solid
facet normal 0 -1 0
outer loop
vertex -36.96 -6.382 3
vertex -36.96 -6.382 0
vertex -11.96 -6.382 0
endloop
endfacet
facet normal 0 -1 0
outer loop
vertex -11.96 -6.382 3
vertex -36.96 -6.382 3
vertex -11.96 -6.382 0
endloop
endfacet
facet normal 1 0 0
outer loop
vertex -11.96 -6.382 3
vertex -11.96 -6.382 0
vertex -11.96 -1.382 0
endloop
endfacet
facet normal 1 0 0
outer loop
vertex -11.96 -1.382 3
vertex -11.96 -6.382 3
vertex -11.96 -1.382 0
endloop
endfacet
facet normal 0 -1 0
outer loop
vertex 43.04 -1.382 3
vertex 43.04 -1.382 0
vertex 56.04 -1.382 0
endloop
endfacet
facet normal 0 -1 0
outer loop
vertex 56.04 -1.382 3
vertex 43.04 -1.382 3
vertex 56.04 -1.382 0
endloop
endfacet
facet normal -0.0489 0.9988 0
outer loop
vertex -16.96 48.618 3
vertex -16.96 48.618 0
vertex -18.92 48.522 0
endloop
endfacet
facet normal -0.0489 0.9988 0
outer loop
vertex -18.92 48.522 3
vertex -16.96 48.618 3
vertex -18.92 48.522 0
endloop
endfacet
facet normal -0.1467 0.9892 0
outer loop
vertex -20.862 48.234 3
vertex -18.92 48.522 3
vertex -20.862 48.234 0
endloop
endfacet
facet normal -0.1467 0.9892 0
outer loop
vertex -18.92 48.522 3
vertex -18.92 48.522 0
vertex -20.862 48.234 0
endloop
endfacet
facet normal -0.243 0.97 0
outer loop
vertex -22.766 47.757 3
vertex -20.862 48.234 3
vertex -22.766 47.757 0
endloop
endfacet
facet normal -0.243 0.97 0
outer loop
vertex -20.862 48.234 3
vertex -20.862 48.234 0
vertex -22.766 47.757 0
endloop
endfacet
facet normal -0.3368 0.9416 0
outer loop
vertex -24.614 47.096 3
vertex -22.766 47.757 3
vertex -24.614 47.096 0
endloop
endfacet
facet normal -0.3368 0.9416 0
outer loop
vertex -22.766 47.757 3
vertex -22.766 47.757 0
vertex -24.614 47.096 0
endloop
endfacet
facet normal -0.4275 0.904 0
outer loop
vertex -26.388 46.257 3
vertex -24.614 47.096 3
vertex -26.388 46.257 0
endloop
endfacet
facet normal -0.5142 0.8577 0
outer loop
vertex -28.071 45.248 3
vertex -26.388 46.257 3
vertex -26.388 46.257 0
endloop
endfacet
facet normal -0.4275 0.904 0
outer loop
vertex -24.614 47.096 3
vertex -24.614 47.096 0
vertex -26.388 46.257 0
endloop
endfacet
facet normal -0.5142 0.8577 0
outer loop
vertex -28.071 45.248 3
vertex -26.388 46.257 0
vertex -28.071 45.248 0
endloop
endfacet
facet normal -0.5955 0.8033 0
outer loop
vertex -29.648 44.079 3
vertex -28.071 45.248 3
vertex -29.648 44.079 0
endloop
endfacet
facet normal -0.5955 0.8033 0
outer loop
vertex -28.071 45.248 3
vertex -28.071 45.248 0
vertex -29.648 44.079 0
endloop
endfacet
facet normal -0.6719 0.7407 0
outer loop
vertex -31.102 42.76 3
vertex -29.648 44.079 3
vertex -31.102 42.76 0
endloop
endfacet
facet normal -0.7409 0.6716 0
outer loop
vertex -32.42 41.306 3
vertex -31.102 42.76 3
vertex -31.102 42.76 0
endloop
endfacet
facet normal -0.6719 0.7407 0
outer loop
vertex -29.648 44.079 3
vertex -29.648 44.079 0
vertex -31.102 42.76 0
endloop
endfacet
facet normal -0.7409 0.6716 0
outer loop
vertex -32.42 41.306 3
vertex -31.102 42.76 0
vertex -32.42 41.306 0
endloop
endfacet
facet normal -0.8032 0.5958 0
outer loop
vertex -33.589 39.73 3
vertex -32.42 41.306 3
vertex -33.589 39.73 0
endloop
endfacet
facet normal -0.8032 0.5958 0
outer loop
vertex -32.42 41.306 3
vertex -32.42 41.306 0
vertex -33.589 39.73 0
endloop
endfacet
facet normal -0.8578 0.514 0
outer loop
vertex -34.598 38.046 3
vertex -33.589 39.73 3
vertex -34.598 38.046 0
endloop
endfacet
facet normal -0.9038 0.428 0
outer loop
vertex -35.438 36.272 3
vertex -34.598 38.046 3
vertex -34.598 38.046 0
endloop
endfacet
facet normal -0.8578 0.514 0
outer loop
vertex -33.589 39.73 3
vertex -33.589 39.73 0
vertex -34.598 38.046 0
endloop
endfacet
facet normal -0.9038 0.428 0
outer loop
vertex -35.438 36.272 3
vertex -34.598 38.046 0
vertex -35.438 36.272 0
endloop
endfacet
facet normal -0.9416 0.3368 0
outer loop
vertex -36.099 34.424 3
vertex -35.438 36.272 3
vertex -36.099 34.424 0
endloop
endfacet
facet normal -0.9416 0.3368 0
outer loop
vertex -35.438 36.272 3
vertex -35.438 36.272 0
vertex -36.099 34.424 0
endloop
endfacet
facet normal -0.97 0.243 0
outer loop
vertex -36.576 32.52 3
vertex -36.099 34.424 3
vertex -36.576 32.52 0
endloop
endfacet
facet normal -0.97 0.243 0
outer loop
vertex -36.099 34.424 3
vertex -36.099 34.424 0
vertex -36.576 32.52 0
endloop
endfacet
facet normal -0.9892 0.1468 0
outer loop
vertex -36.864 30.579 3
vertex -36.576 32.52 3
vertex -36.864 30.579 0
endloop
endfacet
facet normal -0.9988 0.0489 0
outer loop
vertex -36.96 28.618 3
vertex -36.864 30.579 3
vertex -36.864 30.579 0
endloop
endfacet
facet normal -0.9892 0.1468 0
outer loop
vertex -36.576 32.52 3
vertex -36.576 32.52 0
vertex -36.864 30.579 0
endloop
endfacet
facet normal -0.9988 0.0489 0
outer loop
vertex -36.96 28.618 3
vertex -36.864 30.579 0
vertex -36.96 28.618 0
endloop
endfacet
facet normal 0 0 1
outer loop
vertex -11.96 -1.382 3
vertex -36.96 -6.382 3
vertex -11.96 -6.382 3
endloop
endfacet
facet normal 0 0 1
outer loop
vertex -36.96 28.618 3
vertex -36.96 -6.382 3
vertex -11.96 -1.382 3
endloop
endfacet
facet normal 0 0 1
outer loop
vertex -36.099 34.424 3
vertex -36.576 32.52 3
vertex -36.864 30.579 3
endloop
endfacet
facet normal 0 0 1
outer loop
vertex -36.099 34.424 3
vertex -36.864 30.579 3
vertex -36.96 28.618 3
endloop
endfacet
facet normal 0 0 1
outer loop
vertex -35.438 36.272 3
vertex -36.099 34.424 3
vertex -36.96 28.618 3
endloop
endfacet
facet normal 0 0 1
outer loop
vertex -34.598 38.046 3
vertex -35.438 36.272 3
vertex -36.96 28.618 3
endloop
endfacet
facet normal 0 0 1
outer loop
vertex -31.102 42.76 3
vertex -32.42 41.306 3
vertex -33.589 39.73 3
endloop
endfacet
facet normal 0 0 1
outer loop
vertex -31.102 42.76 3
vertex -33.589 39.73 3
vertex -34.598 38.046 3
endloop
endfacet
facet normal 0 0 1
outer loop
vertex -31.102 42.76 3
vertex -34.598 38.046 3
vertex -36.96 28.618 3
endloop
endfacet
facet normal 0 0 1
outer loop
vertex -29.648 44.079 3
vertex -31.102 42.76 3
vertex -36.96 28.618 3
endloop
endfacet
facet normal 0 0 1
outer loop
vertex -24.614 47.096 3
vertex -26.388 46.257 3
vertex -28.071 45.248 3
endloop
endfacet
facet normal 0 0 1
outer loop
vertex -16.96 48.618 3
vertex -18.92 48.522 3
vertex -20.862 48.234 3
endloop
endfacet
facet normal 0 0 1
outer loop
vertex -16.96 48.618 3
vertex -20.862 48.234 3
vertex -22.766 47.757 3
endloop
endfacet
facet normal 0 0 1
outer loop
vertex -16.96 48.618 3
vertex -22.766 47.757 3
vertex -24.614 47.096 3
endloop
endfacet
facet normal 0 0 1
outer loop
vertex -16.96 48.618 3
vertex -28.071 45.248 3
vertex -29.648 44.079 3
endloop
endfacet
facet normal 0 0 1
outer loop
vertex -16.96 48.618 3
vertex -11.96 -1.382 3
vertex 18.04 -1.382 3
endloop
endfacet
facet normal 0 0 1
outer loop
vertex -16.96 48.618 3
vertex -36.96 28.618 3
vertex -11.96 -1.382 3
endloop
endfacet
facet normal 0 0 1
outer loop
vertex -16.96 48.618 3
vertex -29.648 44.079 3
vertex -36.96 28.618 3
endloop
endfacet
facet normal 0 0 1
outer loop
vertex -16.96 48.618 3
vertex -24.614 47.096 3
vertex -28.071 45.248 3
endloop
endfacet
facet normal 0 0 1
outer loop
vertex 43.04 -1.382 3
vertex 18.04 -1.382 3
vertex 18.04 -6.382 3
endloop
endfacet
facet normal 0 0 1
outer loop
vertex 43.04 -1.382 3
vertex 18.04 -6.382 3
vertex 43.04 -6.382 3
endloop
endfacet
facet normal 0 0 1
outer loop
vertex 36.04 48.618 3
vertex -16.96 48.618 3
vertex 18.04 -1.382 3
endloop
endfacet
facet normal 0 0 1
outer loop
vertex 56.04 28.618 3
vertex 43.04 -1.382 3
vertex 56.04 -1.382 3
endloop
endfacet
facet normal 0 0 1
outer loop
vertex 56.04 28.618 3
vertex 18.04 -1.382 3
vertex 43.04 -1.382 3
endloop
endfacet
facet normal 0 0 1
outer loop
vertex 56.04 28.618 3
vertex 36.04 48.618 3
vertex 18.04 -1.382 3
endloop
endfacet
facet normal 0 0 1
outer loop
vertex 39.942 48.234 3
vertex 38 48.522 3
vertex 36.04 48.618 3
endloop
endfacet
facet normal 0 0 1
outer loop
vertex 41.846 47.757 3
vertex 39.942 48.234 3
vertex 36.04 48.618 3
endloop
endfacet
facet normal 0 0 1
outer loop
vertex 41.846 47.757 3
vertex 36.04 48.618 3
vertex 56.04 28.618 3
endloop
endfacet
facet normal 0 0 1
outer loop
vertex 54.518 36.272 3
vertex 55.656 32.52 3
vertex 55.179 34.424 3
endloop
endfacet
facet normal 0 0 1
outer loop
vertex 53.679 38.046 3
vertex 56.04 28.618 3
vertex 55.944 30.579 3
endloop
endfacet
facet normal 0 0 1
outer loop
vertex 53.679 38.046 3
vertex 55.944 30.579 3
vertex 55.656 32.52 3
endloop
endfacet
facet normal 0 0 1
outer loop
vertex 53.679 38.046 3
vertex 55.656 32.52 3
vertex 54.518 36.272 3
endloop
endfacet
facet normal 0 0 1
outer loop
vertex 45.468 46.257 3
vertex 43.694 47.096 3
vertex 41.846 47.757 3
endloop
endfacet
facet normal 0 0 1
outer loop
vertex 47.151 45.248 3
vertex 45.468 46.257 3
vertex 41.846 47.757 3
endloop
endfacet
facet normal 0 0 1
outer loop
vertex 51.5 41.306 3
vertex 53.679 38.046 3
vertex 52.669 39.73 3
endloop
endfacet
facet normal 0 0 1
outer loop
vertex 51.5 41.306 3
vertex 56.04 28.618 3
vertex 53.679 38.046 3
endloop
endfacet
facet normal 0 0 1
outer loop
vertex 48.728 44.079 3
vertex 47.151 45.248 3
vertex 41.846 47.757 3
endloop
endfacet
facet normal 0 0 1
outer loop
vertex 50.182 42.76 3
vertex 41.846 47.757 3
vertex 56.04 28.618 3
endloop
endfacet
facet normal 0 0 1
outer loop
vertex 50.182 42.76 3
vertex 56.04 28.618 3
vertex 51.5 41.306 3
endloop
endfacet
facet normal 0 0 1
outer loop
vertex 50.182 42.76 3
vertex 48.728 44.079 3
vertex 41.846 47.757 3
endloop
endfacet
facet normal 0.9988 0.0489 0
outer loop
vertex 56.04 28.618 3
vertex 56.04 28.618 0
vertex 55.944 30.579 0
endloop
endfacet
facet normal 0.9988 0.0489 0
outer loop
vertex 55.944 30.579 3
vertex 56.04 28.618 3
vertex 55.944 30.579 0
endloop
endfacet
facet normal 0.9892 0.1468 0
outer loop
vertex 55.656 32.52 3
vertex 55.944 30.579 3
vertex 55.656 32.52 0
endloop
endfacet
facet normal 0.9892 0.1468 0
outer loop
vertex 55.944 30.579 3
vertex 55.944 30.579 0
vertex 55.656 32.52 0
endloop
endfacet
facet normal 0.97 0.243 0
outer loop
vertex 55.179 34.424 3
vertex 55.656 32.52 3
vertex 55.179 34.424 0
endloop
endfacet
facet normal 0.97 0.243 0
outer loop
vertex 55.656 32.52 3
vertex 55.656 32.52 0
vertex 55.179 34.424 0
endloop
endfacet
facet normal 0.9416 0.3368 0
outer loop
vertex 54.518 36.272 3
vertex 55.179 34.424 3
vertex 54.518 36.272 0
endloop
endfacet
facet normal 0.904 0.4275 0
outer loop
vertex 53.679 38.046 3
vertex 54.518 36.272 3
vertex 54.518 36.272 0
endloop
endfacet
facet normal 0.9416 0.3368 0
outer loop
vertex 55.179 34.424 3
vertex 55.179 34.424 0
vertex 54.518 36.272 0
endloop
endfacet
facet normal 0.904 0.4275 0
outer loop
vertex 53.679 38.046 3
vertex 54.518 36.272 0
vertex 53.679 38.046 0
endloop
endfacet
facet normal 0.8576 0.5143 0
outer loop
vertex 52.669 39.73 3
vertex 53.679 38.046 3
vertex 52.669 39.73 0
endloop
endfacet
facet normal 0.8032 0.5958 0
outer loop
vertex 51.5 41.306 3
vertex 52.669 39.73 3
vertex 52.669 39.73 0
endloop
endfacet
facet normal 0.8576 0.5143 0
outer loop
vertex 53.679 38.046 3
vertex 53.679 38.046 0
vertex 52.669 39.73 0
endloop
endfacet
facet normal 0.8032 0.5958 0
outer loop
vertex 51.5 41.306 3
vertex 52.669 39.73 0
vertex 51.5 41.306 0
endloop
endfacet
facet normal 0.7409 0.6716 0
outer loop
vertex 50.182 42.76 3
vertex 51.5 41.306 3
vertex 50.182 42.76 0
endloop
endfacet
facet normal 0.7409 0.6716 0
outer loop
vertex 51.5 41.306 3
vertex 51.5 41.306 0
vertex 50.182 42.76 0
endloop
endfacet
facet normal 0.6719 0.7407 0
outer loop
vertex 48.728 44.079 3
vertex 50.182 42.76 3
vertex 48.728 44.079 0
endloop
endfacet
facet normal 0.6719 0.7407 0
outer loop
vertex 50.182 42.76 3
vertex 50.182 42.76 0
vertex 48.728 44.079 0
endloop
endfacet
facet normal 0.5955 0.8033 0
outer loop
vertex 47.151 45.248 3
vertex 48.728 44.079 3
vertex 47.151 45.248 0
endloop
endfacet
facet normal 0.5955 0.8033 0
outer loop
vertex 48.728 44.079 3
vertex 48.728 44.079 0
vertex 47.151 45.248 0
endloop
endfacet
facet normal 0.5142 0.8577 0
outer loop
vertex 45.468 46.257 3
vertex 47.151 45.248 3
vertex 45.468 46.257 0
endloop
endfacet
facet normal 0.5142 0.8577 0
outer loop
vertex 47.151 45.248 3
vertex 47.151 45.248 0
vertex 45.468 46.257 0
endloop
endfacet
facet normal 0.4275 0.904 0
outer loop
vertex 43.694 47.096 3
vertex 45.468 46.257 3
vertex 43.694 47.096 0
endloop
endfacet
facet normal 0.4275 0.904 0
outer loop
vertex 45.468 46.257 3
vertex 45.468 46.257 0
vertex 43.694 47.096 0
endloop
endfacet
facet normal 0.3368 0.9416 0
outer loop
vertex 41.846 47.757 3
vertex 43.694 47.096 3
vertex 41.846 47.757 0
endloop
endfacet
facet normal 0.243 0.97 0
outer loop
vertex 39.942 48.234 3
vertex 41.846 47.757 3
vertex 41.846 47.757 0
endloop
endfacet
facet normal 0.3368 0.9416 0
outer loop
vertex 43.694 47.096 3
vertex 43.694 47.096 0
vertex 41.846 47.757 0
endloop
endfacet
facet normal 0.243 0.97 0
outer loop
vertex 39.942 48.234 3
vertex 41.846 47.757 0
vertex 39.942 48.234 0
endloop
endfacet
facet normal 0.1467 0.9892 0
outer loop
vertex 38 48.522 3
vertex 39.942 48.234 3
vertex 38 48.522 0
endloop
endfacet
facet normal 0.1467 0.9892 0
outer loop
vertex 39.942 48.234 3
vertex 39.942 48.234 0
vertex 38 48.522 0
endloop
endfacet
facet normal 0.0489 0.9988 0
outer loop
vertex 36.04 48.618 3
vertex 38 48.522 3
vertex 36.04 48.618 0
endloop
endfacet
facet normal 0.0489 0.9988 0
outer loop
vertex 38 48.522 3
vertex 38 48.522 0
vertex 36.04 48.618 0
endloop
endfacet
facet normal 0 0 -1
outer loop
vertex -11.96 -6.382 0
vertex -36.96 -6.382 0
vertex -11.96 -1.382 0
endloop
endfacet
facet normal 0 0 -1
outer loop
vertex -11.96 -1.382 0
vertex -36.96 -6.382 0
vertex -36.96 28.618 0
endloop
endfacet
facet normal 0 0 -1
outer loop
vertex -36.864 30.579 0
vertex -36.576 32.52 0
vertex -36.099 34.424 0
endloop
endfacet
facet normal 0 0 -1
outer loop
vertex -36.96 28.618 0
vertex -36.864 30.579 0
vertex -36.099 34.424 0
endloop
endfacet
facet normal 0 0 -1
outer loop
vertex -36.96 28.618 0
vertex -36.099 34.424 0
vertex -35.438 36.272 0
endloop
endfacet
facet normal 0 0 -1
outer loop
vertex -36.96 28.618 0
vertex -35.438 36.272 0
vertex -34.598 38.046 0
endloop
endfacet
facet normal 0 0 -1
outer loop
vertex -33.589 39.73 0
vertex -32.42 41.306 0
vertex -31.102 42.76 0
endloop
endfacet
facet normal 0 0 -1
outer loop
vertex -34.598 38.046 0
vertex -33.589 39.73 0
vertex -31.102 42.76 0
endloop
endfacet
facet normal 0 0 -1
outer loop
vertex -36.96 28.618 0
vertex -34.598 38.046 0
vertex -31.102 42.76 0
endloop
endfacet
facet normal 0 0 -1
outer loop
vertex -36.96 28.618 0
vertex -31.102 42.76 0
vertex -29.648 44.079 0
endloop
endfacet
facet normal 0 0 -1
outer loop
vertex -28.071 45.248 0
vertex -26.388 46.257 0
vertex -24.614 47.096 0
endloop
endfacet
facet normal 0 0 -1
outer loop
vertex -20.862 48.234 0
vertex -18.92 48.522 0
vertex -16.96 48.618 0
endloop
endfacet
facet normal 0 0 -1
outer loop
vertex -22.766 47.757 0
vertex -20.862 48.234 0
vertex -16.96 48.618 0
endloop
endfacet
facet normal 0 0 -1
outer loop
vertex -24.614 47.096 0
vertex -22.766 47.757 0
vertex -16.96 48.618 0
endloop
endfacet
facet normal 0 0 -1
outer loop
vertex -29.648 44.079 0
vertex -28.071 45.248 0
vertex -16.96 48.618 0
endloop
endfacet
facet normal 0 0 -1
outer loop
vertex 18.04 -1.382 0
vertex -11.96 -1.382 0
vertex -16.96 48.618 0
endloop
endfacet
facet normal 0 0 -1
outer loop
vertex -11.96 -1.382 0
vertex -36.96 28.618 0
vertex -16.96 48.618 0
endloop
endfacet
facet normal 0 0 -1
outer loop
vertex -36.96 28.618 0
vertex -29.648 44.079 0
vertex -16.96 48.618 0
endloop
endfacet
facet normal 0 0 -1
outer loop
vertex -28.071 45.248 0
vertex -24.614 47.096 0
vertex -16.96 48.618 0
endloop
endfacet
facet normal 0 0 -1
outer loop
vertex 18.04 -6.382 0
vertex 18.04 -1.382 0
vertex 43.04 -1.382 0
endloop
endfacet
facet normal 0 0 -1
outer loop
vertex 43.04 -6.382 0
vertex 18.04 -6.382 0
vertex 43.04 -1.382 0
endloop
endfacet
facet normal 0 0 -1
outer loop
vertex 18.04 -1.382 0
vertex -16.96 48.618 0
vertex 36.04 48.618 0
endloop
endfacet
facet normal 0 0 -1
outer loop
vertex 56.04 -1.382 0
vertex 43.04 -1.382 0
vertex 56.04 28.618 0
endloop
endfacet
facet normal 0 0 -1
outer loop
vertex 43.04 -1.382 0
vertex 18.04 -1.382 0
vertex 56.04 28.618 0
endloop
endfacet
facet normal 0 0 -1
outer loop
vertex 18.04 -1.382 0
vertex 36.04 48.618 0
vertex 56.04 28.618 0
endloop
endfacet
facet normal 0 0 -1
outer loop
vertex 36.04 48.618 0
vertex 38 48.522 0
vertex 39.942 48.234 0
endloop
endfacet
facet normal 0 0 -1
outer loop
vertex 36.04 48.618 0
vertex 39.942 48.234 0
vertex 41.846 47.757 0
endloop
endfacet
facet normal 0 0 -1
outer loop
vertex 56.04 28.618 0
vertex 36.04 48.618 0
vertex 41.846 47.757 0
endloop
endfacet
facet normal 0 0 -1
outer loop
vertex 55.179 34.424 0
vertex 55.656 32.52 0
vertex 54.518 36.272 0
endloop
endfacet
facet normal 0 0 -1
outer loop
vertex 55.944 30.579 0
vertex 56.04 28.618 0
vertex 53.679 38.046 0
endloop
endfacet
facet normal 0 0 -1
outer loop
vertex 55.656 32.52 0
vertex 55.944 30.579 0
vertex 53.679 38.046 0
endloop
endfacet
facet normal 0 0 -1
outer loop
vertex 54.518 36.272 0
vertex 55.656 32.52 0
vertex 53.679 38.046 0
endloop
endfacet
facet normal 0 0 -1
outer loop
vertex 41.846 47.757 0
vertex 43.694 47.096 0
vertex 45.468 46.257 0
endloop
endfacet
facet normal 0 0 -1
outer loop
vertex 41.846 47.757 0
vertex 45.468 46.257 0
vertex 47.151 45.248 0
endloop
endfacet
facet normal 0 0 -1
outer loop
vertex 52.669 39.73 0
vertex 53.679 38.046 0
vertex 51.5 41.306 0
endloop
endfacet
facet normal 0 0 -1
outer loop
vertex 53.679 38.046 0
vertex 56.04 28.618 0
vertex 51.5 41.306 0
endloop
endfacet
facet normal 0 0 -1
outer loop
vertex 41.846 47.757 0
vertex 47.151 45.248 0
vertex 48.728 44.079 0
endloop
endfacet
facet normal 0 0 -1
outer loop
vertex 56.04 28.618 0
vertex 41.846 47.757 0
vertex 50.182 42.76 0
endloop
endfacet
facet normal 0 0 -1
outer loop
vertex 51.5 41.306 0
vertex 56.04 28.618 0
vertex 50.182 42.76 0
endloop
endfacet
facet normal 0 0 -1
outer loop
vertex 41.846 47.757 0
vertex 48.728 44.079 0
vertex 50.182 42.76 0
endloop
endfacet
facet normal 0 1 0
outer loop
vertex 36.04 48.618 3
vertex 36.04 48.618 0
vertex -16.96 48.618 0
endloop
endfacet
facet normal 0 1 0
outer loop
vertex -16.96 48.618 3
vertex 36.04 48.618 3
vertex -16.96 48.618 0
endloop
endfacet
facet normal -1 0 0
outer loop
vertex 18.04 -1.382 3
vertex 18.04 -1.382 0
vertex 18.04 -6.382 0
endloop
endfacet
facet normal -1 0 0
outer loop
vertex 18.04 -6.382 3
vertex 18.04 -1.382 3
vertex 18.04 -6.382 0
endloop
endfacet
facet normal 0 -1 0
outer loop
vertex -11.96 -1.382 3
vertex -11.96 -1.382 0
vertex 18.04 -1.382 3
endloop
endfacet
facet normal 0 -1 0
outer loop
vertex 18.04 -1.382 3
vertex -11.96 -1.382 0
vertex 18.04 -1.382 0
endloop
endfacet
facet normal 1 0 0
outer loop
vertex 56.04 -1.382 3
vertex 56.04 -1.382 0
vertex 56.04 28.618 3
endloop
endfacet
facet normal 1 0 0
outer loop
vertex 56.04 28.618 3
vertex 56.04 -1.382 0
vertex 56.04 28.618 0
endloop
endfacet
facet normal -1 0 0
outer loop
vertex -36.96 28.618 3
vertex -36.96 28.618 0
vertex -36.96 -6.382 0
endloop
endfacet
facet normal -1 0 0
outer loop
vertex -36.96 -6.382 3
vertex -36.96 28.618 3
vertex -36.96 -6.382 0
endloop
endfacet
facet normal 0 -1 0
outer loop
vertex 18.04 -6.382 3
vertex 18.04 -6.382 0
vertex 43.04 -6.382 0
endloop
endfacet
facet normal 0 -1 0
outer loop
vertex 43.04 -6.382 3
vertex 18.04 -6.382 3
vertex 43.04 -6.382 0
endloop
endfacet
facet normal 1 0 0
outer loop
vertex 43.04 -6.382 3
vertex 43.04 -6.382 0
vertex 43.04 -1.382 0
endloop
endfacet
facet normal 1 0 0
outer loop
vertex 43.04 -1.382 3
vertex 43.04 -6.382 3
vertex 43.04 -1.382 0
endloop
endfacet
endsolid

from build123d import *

# Parameters (mm, degrees)
RESSALTO_EXTRUS_O1_DEPTH = 3


with BuildPart() as part:
    # Esboço1 → Ressalto-extrusão1 (new body)
    with BuildSketch(Plane.XY):
        with BuildLine():
            Line((43.040081042, -1.381695114), (56.040081042, -1.381695114))
            Line((56.040081042, -1.381695114), (56.040081042, 28.618304886))
            ThreePointArc((56.040081042, 28.618304886), (50.182216666, 42.76044051), (36.040081042, 48.618304886))
            Line((36.040081042, 48.618304886), (-16.959918958, 48.618304886))
            ThreePointArc((-16.959918958, 48.618304886), (-31.102054581, 42.76044051), (-36.959918958, 28.618304886))
            Line((-36.959918958, 28.618304886), (-36.959918958, -1.381695114))
            Line((-36.959918958, -1.381695114), (-36.959918958, -6.381695114))
            Line((-36.959918958, -6.381695114), (-11.959918958, -6.381695114))
            Line((-11.959918958, -6.381695114), (-11.959918958, -1.381695114))
            Line((-11.959918958, -1.381695114), (18.040081042, -1.381695114))
            Line((18.040081042, -1.381695114), (18.040081042, -6.381695114))
            Line((18.040081042, -6.381695114), (43.040081042, -6.381695114))
            Line((43.040081042, -6.381695114), (43.040081042, -1.381695114))
        make_face()
    extrude(amount=RESSALTO_EXTRUS_O1_DEPTH)


solid = part.part
